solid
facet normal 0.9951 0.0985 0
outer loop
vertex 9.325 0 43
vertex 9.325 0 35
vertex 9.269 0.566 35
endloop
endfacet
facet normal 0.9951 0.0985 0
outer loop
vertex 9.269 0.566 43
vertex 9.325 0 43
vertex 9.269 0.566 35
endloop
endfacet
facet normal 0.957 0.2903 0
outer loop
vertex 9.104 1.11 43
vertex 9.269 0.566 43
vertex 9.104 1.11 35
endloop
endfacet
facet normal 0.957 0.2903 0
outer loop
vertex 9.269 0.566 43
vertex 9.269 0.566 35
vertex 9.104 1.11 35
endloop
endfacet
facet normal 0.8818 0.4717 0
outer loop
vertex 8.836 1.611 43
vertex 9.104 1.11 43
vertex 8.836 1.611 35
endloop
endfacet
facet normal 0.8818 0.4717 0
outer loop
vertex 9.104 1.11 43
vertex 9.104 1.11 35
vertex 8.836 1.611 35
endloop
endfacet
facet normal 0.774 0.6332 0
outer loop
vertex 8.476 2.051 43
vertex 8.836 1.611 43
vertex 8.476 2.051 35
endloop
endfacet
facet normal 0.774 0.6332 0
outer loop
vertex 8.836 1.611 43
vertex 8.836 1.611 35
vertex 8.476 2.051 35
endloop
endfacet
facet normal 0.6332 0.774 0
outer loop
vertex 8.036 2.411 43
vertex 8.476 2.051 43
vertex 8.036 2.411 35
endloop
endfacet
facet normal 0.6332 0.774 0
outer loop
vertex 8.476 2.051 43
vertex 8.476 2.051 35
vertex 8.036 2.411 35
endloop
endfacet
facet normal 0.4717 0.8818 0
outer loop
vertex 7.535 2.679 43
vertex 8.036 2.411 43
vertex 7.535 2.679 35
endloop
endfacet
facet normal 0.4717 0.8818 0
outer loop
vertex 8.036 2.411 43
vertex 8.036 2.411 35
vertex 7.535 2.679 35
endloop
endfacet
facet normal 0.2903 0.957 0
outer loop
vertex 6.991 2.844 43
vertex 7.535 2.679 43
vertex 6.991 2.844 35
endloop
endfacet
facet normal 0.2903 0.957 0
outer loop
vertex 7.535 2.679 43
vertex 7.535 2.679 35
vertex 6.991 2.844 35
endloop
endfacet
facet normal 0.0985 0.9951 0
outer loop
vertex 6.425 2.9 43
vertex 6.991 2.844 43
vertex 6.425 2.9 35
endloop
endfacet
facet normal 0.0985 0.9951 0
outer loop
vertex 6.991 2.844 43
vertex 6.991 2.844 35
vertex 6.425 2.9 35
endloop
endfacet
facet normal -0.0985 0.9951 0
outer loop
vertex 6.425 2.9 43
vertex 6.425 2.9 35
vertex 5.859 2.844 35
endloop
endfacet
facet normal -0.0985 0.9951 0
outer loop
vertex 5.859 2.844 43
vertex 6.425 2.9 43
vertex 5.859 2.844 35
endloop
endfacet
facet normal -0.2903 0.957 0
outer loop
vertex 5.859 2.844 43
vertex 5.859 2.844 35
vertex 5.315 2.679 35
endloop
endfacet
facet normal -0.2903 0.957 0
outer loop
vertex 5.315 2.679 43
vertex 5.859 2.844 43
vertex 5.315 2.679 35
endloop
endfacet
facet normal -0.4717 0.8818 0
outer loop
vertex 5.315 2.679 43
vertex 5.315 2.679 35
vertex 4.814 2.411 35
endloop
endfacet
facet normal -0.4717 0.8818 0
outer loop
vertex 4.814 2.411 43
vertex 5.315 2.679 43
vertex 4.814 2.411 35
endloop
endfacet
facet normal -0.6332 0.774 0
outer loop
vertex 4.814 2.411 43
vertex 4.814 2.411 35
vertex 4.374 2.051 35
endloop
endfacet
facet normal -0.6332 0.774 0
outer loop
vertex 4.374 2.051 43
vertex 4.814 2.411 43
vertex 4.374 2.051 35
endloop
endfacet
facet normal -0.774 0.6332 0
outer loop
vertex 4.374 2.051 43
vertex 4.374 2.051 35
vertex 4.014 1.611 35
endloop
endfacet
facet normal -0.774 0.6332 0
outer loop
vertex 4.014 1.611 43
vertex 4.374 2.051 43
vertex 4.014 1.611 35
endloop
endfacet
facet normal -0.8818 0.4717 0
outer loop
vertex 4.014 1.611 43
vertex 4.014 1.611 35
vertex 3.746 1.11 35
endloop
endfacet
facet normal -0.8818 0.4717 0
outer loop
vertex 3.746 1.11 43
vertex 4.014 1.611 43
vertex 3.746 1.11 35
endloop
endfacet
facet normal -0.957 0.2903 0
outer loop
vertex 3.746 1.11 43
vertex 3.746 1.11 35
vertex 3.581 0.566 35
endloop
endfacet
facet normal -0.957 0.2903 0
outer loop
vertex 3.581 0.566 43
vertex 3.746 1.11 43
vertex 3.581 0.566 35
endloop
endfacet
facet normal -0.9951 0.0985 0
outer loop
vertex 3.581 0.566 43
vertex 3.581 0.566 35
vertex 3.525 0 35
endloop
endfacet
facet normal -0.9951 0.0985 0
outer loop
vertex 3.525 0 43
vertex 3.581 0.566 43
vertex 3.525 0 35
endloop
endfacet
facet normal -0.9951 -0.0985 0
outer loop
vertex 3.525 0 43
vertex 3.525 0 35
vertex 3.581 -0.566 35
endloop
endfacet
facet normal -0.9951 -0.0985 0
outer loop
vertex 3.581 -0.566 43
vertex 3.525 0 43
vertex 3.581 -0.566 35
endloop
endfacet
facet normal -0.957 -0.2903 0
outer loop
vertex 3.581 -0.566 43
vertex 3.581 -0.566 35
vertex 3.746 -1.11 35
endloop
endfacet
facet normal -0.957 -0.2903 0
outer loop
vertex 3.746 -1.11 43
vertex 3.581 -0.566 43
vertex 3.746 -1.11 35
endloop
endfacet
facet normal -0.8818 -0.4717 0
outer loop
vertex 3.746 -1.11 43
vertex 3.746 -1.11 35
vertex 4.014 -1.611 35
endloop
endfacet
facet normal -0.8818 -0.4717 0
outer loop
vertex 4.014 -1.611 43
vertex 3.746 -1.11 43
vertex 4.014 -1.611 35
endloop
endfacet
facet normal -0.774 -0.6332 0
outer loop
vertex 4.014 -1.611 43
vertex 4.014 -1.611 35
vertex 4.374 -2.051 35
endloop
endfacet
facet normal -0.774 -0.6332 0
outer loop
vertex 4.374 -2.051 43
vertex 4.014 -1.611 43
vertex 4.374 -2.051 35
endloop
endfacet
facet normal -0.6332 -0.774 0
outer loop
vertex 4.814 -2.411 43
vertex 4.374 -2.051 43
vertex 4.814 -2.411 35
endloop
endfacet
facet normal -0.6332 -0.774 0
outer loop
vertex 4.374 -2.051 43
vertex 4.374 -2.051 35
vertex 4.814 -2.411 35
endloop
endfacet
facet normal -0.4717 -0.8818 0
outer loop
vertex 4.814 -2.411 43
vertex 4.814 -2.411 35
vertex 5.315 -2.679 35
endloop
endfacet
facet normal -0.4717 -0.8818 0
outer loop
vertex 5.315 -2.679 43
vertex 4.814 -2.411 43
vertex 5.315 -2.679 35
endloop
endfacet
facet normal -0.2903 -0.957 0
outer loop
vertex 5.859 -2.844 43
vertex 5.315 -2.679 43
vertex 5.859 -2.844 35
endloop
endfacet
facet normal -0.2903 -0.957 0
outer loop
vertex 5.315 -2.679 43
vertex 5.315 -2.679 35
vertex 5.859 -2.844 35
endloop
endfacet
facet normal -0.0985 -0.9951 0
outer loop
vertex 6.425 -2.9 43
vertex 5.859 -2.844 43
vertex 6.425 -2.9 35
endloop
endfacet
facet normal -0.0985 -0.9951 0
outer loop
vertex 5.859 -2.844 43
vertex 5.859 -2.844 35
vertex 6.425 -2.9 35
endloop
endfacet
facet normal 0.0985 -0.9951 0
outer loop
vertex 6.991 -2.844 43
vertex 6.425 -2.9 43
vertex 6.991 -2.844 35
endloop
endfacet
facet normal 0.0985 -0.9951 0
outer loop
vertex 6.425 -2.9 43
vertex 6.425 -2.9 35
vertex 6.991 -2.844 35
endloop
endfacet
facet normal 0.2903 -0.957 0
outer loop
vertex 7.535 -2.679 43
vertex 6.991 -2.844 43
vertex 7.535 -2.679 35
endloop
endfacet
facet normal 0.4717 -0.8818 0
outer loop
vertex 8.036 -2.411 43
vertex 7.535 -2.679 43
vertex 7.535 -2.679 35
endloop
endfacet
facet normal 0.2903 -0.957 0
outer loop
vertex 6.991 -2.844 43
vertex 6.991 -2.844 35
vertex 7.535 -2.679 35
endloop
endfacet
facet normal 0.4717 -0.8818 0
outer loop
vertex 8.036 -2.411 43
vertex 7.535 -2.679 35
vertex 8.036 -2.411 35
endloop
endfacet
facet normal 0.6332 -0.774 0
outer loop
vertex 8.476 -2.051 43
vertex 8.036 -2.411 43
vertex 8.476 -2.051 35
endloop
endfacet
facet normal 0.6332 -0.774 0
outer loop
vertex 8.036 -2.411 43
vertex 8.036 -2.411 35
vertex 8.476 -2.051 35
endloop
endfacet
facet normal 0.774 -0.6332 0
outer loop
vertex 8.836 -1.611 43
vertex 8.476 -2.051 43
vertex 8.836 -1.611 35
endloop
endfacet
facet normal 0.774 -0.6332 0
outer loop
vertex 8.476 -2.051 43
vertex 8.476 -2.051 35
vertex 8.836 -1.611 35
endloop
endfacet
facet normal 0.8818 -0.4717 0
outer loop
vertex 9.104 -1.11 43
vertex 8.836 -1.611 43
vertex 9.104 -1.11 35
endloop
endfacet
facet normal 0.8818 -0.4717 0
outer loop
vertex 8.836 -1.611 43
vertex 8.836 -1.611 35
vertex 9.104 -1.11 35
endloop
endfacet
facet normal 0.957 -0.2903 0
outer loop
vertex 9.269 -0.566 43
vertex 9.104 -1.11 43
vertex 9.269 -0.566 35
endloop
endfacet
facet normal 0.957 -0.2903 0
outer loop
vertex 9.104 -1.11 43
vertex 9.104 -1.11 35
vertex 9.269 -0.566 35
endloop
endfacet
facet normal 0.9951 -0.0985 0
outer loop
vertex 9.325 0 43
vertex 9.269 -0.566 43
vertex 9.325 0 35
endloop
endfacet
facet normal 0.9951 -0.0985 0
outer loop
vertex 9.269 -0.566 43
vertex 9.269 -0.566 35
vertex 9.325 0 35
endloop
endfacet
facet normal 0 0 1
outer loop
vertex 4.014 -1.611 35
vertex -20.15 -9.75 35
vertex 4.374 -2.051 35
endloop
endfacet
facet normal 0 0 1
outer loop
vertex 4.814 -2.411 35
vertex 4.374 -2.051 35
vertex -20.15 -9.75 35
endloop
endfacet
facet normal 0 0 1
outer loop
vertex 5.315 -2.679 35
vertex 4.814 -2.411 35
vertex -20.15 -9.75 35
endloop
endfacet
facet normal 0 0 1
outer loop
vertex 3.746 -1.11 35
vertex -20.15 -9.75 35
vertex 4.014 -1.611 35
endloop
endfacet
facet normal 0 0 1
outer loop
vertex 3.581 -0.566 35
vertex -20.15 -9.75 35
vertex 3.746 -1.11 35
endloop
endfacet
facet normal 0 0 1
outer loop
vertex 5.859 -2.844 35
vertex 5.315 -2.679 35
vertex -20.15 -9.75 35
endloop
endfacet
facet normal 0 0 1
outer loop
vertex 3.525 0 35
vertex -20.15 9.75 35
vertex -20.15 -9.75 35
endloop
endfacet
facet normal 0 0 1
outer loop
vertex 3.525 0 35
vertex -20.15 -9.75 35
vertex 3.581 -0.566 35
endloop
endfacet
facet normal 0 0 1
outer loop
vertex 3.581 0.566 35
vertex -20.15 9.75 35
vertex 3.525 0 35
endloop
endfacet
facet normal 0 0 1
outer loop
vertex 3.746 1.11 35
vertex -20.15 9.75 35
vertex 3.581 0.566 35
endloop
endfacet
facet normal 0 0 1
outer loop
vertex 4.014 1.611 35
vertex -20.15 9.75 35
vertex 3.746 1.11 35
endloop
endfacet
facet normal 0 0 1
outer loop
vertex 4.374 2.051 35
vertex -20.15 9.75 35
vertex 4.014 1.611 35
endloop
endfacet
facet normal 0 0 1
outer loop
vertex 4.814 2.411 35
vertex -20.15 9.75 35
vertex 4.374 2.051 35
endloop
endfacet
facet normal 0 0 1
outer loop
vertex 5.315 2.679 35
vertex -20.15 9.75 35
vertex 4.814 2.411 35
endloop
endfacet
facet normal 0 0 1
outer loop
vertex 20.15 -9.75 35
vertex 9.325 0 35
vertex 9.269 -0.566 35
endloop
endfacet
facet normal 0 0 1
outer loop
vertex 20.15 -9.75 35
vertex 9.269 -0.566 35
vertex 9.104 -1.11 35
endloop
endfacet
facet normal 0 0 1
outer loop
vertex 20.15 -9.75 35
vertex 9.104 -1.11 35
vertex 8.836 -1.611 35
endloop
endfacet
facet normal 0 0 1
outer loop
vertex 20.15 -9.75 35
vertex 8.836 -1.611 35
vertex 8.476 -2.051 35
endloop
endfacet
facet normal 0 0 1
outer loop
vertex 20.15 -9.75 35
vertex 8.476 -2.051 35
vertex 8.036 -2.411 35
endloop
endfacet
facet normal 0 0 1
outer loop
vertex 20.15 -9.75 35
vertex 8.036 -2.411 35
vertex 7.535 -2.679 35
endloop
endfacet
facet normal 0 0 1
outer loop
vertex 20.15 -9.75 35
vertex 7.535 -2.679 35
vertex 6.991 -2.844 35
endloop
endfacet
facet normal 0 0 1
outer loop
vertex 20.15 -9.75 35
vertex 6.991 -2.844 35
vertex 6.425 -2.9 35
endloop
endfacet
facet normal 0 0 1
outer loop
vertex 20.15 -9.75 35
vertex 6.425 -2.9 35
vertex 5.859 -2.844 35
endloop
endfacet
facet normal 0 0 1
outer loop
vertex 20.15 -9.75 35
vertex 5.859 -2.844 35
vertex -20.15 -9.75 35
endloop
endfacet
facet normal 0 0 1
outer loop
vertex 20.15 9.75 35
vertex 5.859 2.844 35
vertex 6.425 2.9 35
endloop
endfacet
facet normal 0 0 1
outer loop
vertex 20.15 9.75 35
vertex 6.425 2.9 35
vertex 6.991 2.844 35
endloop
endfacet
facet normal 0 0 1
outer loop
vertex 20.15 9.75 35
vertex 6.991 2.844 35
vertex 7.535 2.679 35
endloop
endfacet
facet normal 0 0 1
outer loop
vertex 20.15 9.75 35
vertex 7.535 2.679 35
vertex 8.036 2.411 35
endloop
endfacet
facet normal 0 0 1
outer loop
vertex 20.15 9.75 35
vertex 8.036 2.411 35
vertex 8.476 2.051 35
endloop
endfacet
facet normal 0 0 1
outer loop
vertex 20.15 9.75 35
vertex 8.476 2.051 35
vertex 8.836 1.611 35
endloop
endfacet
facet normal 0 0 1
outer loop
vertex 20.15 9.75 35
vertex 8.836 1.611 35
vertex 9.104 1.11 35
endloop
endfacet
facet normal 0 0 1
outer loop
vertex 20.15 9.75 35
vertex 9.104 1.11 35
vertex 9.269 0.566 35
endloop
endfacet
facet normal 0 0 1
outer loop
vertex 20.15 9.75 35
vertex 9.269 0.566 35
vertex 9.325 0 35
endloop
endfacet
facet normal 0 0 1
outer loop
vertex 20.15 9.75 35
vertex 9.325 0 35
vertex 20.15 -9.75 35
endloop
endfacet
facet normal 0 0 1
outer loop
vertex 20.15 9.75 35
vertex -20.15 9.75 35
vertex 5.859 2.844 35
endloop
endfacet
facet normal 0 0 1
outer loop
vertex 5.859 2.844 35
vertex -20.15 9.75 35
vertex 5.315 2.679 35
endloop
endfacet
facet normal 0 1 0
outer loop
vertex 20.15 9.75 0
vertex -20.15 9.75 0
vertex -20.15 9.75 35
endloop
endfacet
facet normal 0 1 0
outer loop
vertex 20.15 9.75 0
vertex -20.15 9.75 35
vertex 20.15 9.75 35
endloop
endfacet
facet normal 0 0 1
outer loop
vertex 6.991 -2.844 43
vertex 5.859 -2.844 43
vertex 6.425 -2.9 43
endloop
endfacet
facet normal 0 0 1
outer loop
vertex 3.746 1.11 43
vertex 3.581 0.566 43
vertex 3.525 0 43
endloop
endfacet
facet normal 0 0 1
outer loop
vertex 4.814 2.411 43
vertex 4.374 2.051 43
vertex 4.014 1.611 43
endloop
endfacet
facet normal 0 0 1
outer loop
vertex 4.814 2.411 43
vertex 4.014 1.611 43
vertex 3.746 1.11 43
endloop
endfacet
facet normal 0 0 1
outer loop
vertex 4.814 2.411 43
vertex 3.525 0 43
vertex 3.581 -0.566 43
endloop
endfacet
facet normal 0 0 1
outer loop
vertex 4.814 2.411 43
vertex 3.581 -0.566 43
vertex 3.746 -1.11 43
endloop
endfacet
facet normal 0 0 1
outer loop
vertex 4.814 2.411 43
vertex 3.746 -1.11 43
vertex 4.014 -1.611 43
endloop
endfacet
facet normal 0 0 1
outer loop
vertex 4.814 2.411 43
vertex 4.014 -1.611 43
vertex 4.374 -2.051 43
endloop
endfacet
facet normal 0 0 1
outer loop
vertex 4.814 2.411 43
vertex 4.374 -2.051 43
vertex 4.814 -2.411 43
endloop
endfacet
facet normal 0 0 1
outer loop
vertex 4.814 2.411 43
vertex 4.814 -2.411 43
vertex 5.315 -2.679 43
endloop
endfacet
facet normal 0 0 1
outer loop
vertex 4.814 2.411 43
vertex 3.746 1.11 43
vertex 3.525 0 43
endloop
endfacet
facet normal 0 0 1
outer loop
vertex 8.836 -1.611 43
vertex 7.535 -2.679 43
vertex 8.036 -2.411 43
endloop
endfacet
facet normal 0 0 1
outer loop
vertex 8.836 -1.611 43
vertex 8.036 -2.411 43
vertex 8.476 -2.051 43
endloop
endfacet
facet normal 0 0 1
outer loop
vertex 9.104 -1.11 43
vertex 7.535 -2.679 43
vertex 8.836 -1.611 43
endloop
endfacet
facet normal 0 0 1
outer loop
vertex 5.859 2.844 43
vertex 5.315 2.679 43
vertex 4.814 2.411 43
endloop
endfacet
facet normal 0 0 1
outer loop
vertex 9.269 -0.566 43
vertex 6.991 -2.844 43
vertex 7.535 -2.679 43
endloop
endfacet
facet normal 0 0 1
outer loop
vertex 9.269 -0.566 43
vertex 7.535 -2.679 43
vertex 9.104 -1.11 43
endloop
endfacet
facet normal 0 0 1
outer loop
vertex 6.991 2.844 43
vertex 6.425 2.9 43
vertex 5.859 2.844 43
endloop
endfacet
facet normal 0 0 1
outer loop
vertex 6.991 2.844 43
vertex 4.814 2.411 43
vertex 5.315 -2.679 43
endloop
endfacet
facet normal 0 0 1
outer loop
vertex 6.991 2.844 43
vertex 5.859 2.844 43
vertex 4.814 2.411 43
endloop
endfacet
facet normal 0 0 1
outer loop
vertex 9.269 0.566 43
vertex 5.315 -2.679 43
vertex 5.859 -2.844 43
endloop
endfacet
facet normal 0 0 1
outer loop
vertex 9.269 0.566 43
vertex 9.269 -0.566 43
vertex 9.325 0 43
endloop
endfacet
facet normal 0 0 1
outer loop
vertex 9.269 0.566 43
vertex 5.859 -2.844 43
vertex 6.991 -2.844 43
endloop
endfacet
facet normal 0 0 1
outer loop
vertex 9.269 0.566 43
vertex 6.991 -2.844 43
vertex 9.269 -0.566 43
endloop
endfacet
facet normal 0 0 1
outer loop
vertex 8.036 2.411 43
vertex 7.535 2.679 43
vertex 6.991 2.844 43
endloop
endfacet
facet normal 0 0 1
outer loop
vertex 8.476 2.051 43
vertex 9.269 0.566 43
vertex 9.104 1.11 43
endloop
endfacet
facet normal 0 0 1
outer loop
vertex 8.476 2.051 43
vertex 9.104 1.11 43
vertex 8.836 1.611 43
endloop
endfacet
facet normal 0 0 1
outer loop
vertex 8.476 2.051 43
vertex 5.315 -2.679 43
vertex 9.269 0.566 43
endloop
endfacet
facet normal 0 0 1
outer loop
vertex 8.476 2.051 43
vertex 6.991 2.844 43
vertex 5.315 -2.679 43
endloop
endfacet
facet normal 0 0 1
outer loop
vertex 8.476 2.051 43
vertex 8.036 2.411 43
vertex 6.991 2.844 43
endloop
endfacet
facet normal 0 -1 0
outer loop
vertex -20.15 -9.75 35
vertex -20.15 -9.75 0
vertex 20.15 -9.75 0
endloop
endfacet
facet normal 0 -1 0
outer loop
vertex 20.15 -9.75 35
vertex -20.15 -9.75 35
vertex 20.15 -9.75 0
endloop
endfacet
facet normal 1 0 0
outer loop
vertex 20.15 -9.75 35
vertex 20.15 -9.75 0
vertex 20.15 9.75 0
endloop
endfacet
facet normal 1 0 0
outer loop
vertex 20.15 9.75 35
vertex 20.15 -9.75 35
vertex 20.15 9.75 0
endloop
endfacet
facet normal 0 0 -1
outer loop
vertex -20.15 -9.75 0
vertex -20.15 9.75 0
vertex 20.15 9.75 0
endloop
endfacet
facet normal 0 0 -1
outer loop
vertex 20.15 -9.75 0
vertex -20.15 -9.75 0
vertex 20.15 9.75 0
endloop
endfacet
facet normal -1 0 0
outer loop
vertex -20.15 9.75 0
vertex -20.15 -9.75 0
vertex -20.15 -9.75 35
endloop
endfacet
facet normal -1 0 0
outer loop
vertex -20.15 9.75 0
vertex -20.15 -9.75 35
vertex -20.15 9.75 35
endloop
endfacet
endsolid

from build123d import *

# Parameters (mm, degrees)
SKETCH_W     = 40.3
SKETCH_H     = 19.5
PAD_DEPTH    = 35
SKETCH001_R  = 2.9
PAD001_DEPTH = 43


with BuildPart() as part:
    # Sketch → Pad (new body)
    with BuildSketch(Plane.XY):
        Rectangle(SKETCH_W, SKETCH_H)
    extrude(amount=PAD_DEPTH)

    # Sketch001 → Pad001 (join)
    with BuildSketch(Plane.XY):
        with Locations((6.425, 0)):
            Circle(SKETCH001_R)
    extrude(amount=PAD001_DEPTH)


solid = part.part
